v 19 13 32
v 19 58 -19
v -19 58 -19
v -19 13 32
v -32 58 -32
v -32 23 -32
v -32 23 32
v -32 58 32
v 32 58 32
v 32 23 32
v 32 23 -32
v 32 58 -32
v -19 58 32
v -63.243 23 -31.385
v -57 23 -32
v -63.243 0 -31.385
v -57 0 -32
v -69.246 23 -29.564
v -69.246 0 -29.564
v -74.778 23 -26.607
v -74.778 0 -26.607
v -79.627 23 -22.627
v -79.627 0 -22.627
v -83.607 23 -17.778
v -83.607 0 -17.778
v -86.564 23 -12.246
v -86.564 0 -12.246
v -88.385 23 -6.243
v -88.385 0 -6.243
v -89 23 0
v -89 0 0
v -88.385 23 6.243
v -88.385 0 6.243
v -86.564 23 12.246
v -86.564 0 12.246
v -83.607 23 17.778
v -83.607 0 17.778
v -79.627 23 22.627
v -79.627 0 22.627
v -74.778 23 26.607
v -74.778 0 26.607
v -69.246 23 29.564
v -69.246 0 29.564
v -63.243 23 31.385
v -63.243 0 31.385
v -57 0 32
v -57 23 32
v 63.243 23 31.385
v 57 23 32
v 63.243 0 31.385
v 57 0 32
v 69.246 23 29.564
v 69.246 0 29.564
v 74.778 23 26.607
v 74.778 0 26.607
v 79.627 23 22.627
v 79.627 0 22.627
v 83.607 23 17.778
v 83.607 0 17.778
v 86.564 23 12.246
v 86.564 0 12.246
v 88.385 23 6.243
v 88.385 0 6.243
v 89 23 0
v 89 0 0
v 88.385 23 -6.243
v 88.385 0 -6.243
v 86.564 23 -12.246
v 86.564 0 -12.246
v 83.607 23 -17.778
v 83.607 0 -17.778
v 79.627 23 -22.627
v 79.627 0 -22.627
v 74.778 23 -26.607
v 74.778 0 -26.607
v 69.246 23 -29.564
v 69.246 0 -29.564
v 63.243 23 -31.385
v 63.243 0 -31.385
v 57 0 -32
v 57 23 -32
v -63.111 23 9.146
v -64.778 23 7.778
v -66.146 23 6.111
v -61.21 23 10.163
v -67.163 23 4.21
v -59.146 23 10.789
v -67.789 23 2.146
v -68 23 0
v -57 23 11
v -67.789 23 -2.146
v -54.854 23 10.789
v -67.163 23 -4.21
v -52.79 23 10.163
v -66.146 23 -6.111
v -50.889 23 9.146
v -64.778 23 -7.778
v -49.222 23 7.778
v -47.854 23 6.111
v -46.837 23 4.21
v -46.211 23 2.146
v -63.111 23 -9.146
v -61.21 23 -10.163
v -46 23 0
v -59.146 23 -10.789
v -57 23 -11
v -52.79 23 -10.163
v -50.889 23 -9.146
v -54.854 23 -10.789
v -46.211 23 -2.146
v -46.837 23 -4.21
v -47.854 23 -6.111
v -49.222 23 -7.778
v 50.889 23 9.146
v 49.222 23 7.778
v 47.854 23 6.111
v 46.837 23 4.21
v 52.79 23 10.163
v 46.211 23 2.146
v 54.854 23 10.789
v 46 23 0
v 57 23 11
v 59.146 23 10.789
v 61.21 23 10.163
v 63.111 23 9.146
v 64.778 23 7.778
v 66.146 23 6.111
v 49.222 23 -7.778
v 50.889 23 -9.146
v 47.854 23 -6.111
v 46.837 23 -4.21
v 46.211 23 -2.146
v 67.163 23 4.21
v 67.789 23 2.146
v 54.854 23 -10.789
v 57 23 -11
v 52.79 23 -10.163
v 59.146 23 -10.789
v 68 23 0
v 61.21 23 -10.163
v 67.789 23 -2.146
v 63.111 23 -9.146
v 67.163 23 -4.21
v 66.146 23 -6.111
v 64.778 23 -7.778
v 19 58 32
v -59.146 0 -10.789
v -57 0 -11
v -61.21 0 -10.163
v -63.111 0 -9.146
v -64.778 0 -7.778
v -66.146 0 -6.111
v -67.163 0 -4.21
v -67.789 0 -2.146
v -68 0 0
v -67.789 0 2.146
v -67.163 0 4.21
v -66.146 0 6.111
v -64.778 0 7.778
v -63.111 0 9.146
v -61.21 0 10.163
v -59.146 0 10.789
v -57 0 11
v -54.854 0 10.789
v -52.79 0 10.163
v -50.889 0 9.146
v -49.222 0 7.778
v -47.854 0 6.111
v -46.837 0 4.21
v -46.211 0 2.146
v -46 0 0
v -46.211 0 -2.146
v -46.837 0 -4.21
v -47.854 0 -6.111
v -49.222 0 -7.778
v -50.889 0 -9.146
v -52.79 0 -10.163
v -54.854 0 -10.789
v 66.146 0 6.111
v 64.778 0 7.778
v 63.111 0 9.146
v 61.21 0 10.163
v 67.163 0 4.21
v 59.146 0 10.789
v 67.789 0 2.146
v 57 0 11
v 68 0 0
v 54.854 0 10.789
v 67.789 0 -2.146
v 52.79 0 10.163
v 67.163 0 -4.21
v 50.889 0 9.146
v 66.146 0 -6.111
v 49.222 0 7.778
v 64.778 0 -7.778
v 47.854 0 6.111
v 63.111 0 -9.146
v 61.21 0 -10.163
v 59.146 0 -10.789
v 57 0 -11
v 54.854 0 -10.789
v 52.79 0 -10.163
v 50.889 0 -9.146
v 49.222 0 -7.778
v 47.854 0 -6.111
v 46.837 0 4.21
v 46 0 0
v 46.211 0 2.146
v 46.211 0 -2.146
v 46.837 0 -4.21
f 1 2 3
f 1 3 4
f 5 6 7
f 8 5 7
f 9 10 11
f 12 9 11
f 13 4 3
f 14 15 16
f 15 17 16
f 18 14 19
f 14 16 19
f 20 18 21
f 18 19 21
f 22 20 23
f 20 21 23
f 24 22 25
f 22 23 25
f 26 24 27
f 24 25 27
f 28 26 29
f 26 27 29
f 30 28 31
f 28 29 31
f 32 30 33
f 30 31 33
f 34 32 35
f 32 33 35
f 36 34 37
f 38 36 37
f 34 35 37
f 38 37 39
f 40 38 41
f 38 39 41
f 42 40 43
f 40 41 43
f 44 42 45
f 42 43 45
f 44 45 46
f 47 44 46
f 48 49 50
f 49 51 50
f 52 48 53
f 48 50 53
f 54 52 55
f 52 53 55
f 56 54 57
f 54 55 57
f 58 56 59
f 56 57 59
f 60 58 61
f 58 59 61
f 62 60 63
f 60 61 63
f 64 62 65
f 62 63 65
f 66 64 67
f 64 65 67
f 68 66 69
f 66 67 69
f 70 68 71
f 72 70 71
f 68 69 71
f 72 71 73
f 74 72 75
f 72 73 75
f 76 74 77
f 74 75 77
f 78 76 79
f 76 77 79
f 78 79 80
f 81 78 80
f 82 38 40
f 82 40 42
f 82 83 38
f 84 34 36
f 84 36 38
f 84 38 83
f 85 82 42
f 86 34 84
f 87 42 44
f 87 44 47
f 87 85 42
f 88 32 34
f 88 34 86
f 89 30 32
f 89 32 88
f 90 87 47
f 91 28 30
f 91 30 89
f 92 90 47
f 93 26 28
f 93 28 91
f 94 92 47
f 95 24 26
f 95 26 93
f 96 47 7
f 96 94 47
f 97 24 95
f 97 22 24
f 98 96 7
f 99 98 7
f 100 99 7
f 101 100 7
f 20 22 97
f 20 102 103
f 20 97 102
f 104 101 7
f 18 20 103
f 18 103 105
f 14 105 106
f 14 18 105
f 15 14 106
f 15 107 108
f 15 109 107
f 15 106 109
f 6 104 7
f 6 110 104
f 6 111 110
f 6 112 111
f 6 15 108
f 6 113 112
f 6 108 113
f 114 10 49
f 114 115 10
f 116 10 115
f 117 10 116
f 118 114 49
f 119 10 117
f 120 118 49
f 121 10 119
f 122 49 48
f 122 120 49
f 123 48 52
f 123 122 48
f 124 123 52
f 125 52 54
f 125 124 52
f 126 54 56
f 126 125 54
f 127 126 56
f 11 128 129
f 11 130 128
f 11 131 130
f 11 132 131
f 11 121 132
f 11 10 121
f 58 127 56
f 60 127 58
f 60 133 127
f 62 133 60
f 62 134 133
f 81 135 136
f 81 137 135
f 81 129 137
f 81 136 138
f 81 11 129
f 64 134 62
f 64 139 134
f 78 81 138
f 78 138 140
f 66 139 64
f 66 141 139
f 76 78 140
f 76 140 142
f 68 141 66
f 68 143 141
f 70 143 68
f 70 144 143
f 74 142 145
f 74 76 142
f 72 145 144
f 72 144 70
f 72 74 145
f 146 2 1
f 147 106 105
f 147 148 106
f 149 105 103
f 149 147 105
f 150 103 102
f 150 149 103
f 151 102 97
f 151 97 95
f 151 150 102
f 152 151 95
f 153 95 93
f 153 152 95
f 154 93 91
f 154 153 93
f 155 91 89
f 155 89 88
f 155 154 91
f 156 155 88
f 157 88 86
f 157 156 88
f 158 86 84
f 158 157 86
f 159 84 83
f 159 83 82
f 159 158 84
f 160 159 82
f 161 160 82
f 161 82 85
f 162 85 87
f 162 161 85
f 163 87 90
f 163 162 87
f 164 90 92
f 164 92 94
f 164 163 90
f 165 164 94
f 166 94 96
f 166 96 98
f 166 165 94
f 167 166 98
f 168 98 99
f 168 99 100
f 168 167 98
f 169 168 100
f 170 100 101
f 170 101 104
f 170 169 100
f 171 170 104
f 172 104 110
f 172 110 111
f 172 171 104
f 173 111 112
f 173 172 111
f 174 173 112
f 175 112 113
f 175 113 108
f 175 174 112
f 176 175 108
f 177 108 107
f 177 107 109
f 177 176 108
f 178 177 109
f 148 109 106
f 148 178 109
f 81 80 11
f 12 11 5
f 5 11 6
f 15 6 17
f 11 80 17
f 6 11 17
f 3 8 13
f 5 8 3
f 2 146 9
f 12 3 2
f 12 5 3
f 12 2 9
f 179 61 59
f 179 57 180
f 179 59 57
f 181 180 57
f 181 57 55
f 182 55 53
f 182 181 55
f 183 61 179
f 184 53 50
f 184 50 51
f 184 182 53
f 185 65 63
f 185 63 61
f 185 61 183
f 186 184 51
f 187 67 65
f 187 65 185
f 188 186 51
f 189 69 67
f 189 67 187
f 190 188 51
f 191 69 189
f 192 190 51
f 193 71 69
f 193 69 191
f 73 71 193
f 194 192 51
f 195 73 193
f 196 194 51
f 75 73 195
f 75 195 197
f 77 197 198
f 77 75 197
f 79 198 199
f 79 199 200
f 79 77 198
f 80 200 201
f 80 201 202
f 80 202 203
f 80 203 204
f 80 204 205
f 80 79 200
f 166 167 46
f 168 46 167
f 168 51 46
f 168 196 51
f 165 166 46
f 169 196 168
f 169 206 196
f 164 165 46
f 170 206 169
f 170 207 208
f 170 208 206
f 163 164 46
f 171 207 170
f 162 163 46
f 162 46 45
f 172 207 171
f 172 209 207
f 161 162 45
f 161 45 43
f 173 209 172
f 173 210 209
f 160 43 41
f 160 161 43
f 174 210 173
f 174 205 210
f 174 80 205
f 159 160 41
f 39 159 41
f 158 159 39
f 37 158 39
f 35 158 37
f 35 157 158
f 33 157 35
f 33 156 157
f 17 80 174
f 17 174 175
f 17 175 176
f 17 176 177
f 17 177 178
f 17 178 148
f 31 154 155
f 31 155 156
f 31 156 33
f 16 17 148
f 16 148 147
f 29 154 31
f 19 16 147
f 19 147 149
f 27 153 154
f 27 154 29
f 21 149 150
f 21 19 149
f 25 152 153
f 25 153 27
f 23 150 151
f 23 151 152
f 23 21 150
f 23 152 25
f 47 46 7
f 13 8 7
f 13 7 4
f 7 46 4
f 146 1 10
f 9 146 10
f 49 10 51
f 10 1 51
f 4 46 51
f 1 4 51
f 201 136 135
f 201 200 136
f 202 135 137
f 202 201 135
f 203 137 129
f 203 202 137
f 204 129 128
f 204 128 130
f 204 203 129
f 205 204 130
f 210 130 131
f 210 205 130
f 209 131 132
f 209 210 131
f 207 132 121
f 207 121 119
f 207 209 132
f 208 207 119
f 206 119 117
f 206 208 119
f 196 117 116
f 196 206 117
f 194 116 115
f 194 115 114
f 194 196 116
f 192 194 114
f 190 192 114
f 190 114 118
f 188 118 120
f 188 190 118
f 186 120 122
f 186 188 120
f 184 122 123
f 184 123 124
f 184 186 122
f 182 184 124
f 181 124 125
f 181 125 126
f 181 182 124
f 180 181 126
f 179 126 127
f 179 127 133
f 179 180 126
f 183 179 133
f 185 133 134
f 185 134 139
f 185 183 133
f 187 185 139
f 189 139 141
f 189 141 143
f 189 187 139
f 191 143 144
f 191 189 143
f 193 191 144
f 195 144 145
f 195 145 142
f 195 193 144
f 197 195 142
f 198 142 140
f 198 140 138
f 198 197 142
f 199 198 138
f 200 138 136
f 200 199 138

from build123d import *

# Parameters (mm, degrees)
SKETCH1_R           = 11
BOSS_EXTRUDE2_DEPTH = 13
SKETCH4_W           = 38
SKETCH4_H           = 51
BOSS_EXTRUDE3_DEPTH = 45
CUT_EXTRUDE1_DEPTH  = 45
BOSS_EXTRUDE4_DEPTH = 45
SKETCH15_R          = 11
BOSS_EXTRUDE6_DEPTH = 10
SKETCH16_R          = 11
BOSS_EXTRUDE7_DEPTH = 10


with BuildPart() as part:
    # Sketch1 → Boss-Extrude2 (new body)
    with BuildSketch(Plane(origin=(0, 0, 0), x_dir=(1, 0, 0), z_dir=(0, 1, 0))):
        with BuildLine():
            Line((-57, 32), (57, 32))
            ThreePointArc((57, 32), (89, 0), (57, -32))
            Line((57, -32), (-57, -32))
            ThreePointArc((-57, -32), (-89, 0), (-57, 32))
        make_face()
        with Locations(Location((-57, 0, 0), (0, 0, 90))):
            Circle(SKETCH1_R, mode=Mode.SUBTRACT)
        with Locations(Location((57, 0, 0), (0, 0, 90))):
            Circle(SKETCH1_R, mode=Mode.SUBTRACT)
    extrude(amount=BOSS_EXTRUDE2_DEPTH)

    # Sketch4 → Boss-Extrude3 (add)
    with BuildSketch(Plane(origin=(0, 13, 0), x_dir=(1, 0, 0), z_dir=(0, 1, 0))):
        with Locations((0, -6.5)):
            Rectangle(SKETCH4_W, SKETCH4_H)
    extrude(amount=BOSS_EXTRUDE3_DEPTH)

    # Sketch5 → Cut-Extrude1 (cut)
    with BuildSketch(Plane(origin=(19, 0, 0), x_dir=(0, 0, -1), z_dir=(1, 0, 0))):
        Polygon((19, 58), (-32, 13), (-32, 58), align=None)
    extrude(amount=-CUT_EXTRUDE1_DEPTH, mode=Mode.SUBTRACT)

    # Sketch6 → Boss-Extrude4 (add)
    with BuildSketch(Plane(origin=(0, 13, 0), x_dir=(1, 0, 0), z_dir=(0, 1, 0))):
        Polygon((-32, 32), (-32, -32), (-19, -32), (-19, 19), (19, 19), (19, -32), (32, -32), (32, 32), align=None)
    extrude(amount=BOSS_EXTRUDE4_DEPTH)

    # Sketch15 → Boss-Extrude6 (add)
    with BuildSketch(Plane(origin=(0, 13, 0), x_dir=(1, 0, 0), z_dir=(0, 1, 0))):
        with BuildLine():
            Line((-32, 32), (-57, 32))
            ThreePointArc((-57, 32), (-89, 0), (-57, -32))
            Line((-57, -32), (-32, -32))
            Line((-32, -32), (-32, 32))
        make_face()
        with Locations(Location((-57, 0, 0), (0, 0, 90))):
            Circle(SKETCH15_R, mode=Mode.SUBTRACT)
    extrude(amount=BOSS_EXTRUDE6_DEPTH)

    # Sketch16 → Boss-Extrude7 (add)
    with BuildSketch(Plane(origin=(0, 13, 0), x_dir=(1, 0, 0), z_dir=(0, 1, 0))):
        with BuildLine():
            Line((32, -32), (57, -32))
            ThreePointArc((57, -32), (89, 0), (57, 32))
            Line((57, 32), (32, 32))
            Line((32, 32), (32, -32))
        make_face()
        with Locations(Location((57, 0, 0), (0, 0, 90))):
            Circle(SKETCH16_R, mode=Mode.SUBTRACT)
    extrude(amount=BOSS_EXTRUDE7_DEPTH)


solid = part.part
